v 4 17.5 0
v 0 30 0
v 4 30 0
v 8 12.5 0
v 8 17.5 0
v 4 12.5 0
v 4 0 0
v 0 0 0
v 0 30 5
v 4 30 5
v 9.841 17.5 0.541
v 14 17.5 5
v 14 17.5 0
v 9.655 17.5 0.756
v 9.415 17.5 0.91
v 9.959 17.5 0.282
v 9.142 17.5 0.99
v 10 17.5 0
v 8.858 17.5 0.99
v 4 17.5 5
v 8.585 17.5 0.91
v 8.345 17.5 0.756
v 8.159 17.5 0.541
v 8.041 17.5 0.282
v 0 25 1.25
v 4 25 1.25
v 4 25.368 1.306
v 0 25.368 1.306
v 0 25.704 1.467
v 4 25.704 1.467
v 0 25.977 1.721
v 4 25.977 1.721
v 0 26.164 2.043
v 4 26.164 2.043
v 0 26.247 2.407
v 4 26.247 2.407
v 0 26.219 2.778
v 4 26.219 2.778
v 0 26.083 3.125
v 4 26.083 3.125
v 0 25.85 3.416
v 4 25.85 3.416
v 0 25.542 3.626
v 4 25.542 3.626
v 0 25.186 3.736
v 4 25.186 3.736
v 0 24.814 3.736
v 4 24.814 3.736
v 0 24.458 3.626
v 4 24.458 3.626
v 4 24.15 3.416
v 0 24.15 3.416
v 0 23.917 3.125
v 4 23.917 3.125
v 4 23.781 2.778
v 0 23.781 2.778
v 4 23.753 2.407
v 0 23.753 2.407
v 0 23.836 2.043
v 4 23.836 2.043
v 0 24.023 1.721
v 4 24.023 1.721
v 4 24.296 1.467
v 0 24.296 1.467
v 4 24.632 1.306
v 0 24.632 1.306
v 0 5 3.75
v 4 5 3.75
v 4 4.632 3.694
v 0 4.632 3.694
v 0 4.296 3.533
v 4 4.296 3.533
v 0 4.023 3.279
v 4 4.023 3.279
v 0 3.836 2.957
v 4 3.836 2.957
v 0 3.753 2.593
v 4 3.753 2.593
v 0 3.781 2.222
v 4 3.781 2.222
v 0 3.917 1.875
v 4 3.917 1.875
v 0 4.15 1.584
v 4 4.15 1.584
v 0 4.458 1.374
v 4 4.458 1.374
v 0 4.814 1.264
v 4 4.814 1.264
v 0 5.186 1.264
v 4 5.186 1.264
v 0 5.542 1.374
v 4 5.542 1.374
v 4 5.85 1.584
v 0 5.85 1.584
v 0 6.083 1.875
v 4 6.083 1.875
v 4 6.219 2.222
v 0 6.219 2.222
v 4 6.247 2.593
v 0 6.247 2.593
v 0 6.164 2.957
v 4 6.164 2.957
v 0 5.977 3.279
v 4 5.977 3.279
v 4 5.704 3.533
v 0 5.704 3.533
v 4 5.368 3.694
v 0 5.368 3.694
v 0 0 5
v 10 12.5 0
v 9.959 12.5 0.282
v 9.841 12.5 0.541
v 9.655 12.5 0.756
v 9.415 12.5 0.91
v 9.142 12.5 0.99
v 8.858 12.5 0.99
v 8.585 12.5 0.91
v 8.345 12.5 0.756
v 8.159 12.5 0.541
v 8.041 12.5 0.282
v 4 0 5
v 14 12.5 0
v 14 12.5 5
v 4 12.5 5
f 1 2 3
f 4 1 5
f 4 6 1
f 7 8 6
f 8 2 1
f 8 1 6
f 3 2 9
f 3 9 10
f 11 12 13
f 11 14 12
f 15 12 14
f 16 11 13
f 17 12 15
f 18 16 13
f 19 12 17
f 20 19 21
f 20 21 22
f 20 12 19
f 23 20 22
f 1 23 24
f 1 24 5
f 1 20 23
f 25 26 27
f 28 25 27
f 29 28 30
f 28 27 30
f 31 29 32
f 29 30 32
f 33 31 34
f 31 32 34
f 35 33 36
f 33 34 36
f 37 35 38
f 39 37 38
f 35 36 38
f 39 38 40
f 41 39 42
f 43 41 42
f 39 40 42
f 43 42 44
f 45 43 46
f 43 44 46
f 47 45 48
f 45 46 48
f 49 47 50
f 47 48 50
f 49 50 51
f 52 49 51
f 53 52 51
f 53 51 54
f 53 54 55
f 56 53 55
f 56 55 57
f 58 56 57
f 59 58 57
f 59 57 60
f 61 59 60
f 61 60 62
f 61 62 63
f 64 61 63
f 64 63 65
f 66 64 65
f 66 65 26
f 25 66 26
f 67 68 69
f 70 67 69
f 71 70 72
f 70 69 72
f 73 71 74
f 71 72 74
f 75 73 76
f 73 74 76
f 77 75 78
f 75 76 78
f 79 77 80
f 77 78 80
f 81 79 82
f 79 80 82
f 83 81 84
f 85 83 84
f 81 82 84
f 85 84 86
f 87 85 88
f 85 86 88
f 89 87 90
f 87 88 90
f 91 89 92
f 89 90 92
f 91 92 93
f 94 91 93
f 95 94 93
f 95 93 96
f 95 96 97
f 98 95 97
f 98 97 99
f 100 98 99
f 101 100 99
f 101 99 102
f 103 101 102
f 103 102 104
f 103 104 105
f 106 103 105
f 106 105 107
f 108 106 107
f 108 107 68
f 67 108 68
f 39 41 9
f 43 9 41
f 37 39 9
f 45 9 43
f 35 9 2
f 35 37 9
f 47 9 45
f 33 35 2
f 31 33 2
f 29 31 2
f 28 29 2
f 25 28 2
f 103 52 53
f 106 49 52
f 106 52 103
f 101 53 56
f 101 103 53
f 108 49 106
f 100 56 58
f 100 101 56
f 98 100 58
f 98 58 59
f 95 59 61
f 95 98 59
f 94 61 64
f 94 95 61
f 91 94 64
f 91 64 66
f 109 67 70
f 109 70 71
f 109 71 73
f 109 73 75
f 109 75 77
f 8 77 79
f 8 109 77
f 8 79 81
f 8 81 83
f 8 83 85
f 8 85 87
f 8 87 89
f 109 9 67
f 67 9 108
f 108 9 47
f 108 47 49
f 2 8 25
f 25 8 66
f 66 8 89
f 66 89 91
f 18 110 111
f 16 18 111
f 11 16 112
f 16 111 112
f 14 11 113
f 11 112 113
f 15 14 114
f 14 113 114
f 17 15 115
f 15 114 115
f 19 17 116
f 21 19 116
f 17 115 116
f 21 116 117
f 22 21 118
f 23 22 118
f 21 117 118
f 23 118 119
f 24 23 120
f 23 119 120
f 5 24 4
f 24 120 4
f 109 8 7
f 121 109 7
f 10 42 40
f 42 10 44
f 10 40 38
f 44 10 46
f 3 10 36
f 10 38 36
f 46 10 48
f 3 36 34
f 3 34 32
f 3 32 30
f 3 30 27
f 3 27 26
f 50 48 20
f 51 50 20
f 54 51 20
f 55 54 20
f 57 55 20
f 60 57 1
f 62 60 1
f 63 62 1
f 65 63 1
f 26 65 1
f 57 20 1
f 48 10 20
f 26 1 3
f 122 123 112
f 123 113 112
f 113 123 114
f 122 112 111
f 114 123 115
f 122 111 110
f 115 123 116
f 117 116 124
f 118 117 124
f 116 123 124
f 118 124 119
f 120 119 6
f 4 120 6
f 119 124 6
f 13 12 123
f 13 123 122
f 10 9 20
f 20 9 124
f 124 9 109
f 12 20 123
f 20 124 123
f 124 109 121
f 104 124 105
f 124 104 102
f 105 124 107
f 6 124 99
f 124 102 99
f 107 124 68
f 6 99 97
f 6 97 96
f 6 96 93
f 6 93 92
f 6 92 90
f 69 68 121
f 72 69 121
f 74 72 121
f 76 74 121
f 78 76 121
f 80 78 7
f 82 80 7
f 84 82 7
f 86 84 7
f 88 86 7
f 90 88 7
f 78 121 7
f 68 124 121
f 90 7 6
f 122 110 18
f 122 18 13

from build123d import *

# Parameters (mm, degrees)
SKETCH1_W           = 4
SKETCH1_H           = 5
BOSS_EXTRUDE1_DEPTH = 30
SKETCH2_W           = 5
SKETCH2_H           = 5
BOSS_EXTRUDE2_DEPTH = 10
SKETCH3_R           = 1.25
CUT_EXTRUDE1_DEPTH  = 33.015621187
CUT_EXTRUDE2_DEPTH  = 34.481338086


with BuildPart() as part:
    # Sketch1 → Boss-Extrude1 (new body)
    with BuildSketch(Plane(origin=(0, 0, 0), x_dir=(1, 0, 0), z_dir=(0, 1, 0))):
        with Locations((2, -2.5)):
            Rectangle(SKETCH1_W, SKETCH1_H)
    extrude(amount=BOSS_EXTRUDE1_DEPTH)

    # Sketch2 → Boss-Extrude2 (add)
    with BuildSketch(Plane(origin=(4, 0, 0), x_dir=(0, 0, -1), z_dir=(1, 0, 0))):
        with Locations((-2.5, 15)):
            Rectangle(SKETCH2_W, SKETCH2_H)
    extrude(amount=BOSS_EXTRUDE2_DEPTH)

    # Sketch3 → Cut-Extrude1 (cut, through all)
    with BuildSketch(Plane(origin=(4, 0, 0), x_dir=(0, 0, -1), z_dir=(1, 0, 0))):
        with Locations((-2.5, 25)):
            Circle(SKETCH3_R)
        with Locations(Location((-2.5, 5, 0), (0, 0, 180))):
            Circle(SKETCH3_R)
    extrude(amount=-CUT_EXTRUDE1_DEPTH, mode=Mode.SUBTRACT)

    # Sketch4 → Cut-Extrude2 (cut, through all)
    with BuildSketch(Plane(origin=(0, 0, 0), x_dir=(1, 0, 0), z_dir=(0, 1, 0))):
        with BuildLine():
            Line((8, 0), (10, 0))
            ThreePointArc((10, 0), (9, -1), (8, 0))
        make_face()
    extrude(amount=CUT_EXTRUDE2_DEPTH, mode=Mode.SUBTRACT)


solid = part.part
